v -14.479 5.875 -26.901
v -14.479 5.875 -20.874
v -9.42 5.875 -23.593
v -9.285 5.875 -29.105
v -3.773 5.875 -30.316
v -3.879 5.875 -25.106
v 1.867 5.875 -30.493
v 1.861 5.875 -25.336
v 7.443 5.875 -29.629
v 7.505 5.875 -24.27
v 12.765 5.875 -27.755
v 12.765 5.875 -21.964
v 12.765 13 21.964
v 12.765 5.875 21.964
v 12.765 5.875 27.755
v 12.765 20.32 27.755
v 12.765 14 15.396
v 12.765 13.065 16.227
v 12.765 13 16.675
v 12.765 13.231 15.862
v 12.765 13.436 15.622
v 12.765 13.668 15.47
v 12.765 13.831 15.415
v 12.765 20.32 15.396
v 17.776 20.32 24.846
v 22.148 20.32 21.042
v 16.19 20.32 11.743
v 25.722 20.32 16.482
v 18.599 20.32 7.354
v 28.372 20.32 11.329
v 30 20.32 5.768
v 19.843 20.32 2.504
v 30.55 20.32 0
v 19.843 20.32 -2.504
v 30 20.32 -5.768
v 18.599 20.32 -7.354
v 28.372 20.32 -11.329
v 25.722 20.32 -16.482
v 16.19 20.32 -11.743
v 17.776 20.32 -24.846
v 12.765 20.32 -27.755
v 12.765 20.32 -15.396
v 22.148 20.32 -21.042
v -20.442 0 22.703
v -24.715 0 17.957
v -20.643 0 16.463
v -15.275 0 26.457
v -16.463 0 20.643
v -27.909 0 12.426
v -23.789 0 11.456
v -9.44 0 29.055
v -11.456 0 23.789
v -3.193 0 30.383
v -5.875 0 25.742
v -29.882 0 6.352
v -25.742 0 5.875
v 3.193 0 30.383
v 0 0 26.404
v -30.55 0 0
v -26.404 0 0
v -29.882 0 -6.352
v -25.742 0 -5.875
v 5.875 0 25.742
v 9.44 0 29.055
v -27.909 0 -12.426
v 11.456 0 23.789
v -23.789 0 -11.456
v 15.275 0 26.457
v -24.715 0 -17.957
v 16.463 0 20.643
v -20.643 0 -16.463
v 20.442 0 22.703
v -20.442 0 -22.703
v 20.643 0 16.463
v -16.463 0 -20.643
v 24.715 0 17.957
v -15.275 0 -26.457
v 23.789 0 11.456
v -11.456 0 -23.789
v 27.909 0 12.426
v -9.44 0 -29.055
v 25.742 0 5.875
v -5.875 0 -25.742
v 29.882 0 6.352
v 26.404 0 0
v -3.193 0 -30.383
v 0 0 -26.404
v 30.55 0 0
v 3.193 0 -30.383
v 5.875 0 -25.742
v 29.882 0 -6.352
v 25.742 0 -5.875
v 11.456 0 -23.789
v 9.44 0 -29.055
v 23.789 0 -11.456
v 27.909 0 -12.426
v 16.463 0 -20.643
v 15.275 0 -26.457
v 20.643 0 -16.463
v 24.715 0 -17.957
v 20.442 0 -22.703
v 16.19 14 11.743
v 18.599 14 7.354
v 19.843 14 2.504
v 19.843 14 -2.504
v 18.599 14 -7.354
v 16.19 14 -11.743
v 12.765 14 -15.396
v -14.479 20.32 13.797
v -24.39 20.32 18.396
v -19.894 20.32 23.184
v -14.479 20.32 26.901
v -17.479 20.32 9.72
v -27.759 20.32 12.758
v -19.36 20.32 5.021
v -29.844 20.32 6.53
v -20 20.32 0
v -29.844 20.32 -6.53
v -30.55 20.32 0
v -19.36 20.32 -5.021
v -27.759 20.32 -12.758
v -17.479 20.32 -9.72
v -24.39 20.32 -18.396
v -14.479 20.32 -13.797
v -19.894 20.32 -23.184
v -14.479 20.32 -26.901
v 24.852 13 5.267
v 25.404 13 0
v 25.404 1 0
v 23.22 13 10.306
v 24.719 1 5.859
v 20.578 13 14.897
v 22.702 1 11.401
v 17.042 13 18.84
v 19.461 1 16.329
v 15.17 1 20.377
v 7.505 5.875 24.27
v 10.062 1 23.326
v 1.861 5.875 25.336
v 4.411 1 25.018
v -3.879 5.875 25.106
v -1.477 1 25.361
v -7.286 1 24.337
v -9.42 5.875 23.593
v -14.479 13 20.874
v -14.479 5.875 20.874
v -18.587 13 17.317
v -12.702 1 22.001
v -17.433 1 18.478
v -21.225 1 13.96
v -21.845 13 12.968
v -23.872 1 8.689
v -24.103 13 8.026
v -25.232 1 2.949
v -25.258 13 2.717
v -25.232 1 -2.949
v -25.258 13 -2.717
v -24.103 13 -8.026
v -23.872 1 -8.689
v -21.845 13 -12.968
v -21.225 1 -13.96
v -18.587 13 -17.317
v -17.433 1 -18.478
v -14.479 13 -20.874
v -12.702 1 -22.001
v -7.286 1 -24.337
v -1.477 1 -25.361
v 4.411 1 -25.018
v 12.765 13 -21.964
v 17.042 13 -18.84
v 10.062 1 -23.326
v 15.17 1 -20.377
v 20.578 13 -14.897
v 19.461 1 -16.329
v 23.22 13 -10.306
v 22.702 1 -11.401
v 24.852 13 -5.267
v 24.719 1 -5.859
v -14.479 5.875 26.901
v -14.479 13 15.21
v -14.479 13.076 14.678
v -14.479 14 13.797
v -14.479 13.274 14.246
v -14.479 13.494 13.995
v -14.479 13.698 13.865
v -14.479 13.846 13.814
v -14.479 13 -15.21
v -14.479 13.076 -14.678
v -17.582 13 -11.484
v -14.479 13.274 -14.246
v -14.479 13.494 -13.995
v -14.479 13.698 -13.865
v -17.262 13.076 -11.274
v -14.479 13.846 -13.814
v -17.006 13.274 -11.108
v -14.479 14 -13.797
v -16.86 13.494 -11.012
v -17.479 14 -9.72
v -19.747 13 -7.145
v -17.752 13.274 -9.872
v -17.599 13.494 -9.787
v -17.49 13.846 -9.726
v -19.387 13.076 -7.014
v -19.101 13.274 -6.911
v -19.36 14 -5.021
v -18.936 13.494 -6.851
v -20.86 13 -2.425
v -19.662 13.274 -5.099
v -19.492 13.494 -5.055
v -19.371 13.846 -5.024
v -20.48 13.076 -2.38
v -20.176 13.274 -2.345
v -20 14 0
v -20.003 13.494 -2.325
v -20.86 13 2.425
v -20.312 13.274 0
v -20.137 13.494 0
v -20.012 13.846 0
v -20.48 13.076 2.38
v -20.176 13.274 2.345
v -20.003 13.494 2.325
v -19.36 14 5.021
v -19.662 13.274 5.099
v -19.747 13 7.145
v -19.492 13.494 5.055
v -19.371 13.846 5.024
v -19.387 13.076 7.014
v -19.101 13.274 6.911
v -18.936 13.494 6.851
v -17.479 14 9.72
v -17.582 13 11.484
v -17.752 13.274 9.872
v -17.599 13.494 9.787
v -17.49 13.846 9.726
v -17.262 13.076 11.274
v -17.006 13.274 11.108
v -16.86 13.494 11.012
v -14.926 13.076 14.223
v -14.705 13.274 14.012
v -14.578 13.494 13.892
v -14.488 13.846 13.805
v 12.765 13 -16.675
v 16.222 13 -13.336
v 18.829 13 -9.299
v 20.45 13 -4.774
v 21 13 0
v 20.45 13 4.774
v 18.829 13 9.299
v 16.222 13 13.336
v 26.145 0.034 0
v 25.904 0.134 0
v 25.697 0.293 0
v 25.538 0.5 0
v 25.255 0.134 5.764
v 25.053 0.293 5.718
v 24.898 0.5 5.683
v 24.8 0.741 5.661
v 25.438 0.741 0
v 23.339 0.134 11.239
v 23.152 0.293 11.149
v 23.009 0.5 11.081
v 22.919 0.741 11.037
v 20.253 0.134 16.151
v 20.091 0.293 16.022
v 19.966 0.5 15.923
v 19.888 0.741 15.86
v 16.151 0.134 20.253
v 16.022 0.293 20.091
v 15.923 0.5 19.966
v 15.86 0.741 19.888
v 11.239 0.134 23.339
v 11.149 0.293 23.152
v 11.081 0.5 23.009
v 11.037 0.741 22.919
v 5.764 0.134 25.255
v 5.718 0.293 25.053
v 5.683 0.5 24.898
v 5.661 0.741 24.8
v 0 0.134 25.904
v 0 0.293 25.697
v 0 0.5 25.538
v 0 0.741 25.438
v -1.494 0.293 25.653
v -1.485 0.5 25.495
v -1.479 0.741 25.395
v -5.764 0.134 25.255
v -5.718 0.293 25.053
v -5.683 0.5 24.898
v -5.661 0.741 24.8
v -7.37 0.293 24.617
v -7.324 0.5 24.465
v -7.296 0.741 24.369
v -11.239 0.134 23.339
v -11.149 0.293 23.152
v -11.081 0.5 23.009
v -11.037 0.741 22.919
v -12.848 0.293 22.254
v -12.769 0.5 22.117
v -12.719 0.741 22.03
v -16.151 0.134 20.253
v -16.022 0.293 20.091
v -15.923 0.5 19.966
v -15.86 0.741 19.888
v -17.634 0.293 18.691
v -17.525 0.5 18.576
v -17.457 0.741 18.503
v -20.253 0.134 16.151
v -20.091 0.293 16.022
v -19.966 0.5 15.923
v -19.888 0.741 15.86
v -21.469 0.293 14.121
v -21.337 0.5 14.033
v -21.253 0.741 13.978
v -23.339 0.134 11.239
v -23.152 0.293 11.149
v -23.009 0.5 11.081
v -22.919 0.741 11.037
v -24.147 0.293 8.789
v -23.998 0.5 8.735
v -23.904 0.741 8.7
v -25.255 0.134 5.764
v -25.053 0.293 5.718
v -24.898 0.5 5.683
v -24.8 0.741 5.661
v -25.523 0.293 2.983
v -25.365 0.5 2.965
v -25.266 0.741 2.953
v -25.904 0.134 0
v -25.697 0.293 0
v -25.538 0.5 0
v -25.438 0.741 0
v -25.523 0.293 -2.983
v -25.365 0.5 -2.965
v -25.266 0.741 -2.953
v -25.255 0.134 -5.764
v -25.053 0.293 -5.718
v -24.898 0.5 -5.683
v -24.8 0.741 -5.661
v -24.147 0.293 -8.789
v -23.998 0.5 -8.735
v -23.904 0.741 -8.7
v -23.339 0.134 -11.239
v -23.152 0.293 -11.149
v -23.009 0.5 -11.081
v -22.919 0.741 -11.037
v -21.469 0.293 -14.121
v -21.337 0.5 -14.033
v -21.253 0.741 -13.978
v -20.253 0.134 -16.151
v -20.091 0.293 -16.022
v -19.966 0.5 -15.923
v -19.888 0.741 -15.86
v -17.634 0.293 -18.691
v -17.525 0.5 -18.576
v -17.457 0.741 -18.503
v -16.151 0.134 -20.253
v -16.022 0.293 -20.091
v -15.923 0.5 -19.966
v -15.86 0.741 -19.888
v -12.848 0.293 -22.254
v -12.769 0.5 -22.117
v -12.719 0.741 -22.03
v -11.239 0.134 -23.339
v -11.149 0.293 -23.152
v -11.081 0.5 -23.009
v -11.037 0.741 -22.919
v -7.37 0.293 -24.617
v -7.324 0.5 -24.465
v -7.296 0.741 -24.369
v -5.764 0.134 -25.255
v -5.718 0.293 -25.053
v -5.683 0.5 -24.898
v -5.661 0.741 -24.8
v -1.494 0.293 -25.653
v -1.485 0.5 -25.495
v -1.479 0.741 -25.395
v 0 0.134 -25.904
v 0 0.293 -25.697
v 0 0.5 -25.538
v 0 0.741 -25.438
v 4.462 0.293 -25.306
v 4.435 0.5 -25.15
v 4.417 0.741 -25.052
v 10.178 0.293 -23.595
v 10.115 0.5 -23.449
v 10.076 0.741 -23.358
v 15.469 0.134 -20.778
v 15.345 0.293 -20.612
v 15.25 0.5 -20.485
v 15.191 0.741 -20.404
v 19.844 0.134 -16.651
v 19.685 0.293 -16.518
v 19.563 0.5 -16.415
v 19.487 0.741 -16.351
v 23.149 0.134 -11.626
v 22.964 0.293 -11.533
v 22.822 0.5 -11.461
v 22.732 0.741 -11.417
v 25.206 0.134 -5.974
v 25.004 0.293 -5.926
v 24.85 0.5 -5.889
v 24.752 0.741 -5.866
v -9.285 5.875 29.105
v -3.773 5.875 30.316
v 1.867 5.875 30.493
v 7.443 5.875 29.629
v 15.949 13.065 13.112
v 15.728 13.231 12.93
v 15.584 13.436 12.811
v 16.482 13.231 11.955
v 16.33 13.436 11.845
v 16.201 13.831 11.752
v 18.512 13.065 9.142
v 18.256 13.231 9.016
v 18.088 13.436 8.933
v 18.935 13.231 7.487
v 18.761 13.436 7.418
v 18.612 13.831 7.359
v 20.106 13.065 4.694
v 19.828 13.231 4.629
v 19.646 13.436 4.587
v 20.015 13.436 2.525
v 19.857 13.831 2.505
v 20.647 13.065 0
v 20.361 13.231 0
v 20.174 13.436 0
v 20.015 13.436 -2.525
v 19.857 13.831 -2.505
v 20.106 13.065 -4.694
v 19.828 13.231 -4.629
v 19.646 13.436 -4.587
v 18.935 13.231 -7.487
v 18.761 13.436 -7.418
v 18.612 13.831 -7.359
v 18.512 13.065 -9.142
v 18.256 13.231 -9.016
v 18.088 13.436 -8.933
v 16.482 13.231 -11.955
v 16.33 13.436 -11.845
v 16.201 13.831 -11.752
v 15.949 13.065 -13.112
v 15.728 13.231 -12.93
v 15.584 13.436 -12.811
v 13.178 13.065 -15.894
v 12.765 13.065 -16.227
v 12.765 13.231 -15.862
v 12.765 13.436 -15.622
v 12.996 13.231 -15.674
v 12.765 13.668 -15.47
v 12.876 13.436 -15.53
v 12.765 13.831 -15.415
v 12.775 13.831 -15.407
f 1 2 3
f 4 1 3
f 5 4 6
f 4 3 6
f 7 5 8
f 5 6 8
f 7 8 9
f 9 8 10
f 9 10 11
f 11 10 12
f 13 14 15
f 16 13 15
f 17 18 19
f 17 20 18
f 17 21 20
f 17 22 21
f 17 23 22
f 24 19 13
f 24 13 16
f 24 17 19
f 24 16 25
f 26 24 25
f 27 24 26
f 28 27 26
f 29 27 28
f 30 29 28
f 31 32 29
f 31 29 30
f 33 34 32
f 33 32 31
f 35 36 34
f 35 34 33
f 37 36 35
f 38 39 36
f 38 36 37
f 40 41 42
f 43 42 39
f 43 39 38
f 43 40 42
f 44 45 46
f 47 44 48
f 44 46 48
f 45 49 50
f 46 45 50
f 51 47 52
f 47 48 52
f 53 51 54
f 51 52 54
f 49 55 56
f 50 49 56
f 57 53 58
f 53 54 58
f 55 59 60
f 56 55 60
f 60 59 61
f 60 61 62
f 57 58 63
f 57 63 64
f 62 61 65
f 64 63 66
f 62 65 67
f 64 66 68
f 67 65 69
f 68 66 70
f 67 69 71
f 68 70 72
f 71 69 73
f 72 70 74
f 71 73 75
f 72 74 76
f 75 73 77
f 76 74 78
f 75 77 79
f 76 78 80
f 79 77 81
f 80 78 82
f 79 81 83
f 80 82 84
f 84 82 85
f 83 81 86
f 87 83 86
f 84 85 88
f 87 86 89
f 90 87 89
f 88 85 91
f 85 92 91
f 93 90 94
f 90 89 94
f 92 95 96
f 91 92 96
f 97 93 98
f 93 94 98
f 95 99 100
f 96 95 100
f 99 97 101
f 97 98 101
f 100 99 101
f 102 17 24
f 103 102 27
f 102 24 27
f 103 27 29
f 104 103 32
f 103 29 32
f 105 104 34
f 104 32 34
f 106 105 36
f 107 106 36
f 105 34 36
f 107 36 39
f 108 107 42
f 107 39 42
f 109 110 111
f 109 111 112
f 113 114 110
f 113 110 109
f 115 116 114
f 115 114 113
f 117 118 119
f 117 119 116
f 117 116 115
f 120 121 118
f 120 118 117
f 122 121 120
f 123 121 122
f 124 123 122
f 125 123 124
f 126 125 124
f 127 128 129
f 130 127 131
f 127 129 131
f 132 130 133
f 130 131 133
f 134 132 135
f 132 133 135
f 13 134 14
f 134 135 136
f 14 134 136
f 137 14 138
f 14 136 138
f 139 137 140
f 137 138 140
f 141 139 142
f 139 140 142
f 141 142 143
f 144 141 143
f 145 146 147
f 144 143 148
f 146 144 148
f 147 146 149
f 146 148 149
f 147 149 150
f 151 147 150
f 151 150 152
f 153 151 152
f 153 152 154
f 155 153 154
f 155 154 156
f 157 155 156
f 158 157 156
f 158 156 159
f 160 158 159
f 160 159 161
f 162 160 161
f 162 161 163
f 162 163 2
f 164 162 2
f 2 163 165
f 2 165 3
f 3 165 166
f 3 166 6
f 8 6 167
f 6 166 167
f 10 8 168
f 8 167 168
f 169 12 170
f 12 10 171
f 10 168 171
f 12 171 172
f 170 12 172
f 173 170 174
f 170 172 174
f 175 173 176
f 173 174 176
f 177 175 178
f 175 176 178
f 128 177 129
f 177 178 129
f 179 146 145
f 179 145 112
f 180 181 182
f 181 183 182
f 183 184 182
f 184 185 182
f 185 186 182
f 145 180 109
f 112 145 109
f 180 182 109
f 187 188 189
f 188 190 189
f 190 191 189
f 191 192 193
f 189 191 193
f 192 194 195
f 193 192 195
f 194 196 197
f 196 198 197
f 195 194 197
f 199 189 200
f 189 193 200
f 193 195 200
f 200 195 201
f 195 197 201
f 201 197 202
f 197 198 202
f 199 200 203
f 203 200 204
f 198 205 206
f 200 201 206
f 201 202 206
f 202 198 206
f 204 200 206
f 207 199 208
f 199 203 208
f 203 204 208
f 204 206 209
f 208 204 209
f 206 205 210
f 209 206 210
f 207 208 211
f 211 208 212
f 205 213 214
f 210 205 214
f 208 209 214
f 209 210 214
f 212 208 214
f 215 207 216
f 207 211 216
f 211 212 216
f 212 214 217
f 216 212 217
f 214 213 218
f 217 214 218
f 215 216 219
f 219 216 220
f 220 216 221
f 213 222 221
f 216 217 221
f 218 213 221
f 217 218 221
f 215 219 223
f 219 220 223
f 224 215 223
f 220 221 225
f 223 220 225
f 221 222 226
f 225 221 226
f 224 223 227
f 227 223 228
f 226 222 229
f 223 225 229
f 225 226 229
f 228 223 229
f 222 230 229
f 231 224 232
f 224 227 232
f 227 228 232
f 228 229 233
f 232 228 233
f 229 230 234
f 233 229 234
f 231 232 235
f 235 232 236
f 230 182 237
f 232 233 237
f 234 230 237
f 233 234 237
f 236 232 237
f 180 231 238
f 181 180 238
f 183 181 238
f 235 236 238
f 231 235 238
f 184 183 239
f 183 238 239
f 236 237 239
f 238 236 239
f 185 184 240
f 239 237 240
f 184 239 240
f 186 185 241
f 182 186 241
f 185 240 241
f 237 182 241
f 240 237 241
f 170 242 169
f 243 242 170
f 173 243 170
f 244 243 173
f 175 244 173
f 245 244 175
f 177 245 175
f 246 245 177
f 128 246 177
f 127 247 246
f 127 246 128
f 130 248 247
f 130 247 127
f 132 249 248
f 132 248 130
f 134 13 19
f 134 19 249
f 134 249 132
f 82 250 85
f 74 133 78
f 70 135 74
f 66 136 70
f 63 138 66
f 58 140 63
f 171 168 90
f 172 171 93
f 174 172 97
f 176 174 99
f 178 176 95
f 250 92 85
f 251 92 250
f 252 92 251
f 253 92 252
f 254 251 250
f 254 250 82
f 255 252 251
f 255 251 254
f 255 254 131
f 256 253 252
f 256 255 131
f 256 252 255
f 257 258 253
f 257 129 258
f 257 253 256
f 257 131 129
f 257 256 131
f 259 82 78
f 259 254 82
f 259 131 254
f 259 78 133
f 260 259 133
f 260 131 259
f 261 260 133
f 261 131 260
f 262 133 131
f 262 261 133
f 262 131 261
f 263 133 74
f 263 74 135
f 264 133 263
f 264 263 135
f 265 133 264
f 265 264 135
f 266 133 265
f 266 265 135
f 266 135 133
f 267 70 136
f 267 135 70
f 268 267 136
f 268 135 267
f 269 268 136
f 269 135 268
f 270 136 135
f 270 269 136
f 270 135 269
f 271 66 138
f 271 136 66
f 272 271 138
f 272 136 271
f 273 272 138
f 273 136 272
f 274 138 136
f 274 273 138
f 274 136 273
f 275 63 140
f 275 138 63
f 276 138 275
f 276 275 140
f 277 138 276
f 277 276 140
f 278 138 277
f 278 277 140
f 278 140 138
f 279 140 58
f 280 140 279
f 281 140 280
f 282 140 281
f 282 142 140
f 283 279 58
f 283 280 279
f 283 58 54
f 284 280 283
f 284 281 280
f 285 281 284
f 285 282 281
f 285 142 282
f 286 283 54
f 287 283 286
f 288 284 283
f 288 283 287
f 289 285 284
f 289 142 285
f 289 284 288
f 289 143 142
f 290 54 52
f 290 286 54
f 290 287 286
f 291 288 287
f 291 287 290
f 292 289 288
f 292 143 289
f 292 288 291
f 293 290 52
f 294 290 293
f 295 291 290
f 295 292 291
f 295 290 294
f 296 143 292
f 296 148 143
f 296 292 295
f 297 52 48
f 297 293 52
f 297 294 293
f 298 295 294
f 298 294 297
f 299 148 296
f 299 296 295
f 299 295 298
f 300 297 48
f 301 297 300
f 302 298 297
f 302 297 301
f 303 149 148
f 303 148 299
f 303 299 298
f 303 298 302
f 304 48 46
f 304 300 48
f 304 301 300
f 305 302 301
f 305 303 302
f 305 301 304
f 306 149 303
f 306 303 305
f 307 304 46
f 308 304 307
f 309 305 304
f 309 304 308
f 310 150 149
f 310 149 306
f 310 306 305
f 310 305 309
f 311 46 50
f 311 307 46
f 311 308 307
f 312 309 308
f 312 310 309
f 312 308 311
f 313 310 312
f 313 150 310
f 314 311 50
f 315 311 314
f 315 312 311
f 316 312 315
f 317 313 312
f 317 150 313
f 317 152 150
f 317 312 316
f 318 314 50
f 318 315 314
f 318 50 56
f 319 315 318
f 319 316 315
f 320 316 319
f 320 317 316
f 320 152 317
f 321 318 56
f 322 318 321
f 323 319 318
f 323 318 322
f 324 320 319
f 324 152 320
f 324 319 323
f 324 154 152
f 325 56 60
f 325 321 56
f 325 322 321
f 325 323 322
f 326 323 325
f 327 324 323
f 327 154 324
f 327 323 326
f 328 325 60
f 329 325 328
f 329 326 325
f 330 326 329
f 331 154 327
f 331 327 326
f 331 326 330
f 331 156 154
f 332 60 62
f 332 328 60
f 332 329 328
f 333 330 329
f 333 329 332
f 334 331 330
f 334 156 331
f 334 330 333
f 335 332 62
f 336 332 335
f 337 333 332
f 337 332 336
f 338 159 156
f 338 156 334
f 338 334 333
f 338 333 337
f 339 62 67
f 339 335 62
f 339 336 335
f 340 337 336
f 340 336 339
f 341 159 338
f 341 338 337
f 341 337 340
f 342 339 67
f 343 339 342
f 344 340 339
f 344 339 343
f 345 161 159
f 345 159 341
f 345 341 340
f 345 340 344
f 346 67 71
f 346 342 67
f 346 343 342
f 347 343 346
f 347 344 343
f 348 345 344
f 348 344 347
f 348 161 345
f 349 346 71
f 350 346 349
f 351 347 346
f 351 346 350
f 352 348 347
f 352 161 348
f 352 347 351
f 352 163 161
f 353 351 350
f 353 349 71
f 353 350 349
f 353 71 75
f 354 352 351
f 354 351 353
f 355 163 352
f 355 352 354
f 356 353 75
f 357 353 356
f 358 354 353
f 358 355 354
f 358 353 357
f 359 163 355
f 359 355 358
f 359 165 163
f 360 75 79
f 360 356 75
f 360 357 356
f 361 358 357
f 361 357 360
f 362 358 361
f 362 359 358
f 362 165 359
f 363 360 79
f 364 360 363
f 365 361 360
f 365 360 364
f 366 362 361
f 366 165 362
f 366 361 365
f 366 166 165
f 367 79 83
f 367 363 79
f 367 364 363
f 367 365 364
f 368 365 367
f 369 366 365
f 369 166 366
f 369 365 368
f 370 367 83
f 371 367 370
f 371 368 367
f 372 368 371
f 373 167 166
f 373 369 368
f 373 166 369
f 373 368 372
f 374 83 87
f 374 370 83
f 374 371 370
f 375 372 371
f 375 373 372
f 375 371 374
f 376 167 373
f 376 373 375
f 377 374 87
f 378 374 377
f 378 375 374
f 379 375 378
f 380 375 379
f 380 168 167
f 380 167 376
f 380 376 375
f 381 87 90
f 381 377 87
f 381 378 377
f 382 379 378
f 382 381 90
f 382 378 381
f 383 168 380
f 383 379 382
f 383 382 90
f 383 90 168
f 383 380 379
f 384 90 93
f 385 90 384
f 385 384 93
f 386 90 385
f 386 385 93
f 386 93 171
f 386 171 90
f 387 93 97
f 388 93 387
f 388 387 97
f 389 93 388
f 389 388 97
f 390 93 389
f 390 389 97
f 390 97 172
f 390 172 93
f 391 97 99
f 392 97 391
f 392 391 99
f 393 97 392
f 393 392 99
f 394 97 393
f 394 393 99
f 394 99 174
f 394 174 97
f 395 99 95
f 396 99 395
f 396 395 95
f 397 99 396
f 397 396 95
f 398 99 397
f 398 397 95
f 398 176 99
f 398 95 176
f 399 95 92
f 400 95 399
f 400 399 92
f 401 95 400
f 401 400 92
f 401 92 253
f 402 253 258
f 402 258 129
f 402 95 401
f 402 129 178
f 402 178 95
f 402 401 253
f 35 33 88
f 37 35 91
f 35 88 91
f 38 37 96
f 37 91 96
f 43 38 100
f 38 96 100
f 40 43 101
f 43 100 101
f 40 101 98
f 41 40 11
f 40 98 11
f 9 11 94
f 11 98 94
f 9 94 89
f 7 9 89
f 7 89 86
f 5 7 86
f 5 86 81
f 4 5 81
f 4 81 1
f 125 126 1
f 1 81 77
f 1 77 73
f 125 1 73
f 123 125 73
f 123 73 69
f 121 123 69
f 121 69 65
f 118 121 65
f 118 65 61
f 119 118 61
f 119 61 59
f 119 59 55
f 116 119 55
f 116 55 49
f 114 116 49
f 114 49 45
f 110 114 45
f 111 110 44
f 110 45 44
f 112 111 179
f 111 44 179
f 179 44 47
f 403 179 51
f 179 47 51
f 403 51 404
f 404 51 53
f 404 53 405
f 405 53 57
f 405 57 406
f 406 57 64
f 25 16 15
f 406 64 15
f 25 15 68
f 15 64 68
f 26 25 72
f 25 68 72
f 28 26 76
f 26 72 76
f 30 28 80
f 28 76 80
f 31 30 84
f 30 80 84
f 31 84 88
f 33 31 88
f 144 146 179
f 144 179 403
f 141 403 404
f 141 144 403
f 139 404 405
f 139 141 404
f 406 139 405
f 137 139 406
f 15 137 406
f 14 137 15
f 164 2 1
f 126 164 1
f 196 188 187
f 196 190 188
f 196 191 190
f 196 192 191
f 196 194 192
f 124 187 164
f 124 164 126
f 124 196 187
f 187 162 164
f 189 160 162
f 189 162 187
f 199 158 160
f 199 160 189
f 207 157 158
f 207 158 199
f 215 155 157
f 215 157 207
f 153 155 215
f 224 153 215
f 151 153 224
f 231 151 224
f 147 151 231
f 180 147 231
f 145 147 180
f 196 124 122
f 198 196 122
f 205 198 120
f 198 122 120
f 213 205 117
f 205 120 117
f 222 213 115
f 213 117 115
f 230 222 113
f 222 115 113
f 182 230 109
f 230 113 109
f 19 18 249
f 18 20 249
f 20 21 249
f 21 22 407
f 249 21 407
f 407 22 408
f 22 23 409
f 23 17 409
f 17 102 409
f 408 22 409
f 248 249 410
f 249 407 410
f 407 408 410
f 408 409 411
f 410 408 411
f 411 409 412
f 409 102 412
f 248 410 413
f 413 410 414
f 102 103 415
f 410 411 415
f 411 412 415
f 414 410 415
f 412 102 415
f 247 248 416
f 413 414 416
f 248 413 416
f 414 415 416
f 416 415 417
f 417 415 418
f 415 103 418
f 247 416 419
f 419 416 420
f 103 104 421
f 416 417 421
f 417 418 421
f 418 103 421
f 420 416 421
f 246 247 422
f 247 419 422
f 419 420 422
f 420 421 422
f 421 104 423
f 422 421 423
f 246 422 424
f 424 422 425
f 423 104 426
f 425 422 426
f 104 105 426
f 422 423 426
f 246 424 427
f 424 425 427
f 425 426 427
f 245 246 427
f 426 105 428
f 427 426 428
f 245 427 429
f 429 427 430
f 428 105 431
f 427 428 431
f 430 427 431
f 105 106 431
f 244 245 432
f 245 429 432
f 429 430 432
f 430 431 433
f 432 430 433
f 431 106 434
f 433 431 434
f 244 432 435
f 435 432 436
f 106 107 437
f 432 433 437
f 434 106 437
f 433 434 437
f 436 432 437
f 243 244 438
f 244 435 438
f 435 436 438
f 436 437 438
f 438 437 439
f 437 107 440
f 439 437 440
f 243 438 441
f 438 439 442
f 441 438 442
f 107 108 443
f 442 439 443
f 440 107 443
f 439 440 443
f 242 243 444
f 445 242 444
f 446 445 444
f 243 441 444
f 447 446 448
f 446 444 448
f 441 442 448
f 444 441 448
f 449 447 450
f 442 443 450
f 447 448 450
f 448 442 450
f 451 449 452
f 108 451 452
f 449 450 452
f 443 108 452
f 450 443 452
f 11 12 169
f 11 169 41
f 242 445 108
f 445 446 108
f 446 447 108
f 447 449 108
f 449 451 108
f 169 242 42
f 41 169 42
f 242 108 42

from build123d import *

# Parameters (mm, degrees)
SKETCH1_R               = 30.55
BOSS_EXTRUDE1_DEPTH     = 20.32
SKETCH2_R               = 25.404
CUT_EXTRUDE1_DEPTH      = 13
SKETCH3_R               = 20
CUT_EXTRUDE2_DEPTH      = 21.32
FILLET1_R               = 1
FILLET2_R               = 1
SKETCH4_W               = 27.244453354
SKETCH4_H               = 24.319072788
CUT_EXTRUDE3_DEPTH      = 31.55
CUT_EXTRUDE3_DEPTH_BACK = 31.55


with BuildPart() as part:
    # Sketch1 → Boss-Extrude1 (new body)
    with BuildSketch(Plane(origin=(0, 0, 0), x_dir=(1, 0, 0), z_dir=(0, 1, 0))):
        Circle(SKETCH1_R)
    extrude(amount=BOSS_EXTRUDE1_DEPTH)

    # Sketch2 → Cut-Extrude1 (cut)
    with BuildSketch(Plane.XZ):
        Circle(SKETCH2_R)
    extrude(amount=-CUT_EXTRUDE1_DEPTH, mode=Mode.SUBTRACT)

    # Sketch3 → Cut-Extrude2 (cut, through all)
    with BuildSketch(Plane(origin=(0, 20.32, 0), x_dir=(1, 0, 0), z_dir=(0, 1, 0))):
        Circle(SKETCH3_R)
    extrude(amount=-CUT_EXTRUDE2_DEPTH, mode=Mode.SUBTRACT)

    # Fillet1
    fillet1_edges = [part.edges().sort_by_distance(p)[0] for p in [
        (-25.404, 0, 0),
    ]]
    fillet(fillet1_edges, radius=FILLET1_R)

    # Fillet2
    fillet2_edges = [part.edges().sort_by_distance(p)[0] for p in [
        (-20, 13, 0),
    ]]
    fillet(fillet2_edges, radius=FILLET2_R)

    # Sketch4 → Cut-Extrude3 (cut, two sides)
    with BuildSketch(Plane.XY) as cut_extrude3_sk:
        with Locations((-0.856929661, 18.03488809)):
            Rectangle(SKETCH4_W, SKETCH4_H)
    extrude(amount=CUT_EXTRUDE3_DEPTH, mode=Mode.SUBTRACT)
    extrude(cut_extrude3_sk.sketch, amount=-CUT_EXTRUDE3_DEPTH_BACK, mode=Mode.SUBTRACT)


solid = part.part
